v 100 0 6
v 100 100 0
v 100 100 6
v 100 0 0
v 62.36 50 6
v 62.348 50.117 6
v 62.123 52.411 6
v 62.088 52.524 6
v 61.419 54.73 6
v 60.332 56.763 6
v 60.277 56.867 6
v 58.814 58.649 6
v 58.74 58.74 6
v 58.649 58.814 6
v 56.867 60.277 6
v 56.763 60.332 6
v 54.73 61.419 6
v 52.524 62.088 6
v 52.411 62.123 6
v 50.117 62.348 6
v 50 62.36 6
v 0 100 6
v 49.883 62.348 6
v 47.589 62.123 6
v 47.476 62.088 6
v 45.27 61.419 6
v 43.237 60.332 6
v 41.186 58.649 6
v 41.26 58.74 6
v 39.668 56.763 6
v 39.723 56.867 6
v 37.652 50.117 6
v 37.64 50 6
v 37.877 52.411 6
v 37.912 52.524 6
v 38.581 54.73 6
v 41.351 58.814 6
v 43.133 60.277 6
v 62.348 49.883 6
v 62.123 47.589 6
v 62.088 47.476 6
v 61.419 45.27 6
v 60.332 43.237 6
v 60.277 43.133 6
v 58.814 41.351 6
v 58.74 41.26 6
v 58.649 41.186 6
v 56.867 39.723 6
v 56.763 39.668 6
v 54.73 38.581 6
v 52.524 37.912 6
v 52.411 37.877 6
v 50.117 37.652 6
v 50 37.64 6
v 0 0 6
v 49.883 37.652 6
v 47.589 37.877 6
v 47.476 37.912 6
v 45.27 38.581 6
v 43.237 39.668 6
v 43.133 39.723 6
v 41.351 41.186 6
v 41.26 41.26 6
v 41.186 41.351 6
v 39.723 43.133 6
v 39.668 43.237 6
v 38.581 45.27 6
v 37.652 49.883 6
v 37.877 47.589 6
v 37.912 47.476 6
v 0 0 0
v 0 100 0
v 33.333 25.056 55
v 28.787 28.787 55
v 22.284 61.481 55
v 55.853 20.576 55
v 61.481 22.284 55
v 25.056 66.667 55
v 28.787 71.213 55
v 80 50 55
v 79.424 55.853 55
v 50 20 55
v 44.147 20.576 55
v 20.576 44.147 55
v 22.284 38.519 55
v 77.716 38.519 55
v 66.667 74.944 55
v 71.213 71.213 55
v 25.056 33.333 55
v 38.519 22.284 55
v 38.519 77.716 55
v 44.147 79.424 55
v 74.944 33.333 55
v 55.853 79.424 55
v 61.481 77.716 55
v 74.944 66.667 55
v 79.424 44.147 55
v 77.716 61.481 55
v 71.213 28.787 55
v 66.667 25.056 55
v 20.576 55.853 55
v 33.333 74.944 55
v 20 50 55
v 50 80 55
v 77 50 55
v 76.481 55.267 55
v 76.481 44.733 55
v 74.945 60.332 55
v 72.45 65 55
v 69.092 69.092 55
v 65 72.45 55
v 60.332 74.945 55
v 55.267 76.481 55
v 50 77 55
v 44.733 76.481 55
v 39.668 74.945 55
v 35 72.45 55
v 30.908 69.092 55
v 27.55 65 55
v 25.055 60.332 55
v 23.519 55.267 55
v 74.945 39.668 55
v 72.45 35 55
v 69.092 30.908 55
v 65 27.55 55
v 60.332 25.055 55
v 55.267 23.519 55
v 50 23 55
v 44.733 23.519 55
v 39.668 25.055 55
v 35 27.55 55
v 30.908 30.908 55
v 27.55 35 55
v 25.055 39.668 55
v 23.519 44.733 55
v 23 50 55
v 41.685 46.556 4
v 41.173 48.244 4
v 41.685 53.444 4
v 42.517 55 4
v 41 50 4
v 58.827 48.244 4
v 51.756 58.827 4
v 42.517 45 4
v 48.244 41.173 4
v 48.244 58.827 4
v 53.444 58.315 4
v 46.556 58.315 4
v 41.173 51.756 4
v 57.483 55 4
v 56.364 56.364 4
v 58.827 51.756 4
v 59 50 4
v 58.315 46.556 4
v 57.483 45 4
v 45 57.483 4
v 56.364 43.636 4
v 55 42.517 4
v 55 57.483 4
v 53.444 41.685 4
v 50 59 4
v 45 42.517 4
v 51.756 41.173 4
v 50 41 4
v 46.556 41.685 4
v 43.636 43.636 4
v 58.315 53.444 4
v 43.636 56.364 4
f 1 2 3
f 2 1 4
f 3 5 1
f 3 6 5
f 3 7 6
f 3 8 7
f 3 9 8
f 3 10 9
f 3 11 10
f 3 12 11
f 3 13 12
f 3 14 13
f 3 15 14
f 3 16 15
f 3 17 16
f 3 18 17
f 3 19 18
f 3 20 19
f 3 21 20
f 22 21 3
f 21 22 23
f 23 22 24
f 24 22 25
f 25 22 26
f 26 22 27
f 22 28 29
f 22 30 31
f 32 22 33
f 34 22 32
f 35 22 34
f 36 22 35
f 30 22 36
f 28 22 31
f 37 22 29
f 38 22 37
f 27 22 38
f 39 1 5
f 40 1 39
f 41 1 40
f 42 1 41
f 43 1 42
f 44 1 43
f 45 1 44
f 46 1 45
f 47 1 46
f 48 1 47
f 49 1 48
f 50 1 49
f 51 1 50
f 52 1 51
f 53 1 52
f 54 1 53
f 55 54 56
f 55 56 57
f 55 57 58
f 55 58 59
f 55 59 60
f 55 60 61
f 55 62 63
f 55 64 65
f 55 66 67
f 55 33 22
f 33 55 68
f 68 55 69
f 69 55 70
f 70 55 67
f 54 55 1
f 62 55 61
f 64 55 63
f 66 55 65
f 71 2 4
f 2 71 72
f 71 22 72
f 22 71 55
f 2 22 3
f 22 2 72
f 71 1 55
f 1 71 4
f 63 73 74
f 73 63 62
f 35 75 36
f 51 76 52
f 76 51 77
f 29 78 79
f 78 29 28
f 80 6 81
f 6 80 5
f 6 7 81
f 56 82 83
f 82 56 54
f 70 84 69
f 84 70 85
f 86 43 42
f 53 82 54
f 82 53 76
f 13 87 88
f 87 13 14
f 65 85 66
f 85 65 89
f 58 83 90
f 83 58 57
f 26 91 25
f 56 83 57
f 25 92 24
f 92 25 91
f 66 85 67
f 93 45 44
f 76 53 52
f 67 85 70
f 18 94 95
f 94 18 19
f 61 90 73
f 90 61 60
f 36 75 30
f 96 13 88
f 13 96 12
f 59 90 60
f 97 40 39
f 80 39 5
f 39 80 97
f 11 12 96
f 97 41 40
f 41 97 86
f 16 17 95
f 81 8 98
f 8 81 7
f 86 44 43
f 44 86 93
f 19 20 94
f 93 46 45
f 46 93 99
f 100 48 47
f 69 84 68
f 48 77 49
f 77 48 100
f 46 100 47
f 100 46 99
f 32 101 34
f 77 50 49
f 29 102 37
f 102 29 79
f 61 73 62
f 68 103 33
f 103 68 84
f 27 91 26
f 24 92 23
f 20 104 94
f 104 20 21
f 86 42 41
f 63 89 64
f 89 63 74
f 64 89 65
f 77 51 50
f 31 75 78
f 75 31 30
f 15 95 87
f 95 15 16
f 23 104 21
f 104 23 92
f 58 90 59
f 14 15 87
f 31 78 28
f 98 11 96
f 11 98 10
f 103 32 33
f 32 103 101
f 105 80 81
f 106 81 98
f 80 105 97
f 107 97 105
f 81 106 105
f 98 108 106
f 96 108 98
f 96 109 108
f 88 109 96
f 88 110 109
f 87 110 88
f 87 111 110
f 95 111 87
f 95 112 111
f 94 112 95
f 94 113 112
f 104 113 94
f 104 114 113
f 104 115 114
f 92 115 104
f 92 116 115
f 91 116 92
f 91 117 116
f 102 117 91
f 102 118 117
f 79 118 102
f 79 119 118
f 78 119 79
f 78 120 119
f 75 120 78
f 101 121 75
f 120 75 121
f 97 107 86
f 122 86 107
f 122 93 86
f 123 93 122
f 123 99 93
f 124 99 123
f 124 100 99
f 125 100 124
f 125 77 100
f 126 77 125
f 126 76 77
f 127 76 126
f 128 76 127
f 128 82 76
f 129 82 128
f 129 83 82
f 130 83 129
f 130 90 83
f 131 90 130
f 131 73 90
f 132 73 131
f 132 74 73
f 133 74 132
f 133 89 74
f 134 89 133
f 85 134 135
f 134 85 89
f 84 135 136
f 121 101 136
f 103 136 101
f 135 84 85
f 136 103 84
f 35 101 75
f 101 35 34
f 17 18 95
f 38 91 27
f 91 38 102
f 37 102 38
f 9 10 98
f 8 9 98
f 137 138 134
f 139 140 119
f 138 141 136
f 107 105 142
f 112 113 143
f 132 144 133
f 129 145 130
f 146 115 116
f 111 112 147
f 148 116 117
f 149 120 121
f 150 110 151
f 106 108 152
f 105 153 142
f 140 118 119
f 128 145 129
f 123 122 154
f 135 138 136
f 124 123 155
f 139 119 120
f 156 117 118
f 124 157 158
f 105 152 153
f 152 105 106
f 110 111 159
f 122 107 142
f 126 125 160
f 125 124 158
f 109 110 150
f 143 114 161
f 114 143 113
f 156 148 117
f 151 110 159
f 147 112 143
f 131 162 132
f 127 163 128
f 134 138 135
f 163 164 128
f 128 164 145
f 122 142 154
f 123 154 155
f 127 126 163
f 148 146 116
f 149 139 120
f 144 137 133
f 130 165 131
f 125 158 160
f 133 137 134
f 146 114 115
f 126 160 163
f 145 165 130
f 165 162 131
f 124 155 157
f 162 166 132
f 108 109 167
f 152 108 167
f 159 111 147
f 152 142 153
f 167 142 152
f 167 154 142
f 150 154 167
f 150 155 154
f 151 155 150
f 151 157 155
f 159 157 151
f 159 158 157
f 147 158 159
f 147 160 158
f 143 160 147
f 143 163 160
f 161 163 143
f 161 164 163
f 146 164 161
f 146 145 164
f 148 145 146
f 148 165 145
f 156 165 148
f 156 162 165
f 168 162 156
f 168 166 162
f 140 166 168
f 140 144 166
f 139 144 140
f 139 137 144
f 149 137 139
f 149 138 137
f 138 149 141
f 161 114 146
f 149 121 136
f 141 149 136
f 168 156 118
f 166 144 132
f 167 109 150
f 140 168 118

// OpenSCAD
$fn = 32;

// ----------------------------------------------------------------------
// Hopper: funnel with square flange
// ----------------------------------------------------------------------

// --- parameters (mm) ---
fl = 100;                 // flange side, X and Y
fl_t = 6;                 // flange thickness
cone_h = 50;              // cone height above the flange
top_d = 60;               // cone mouth diameter
bot_d = 24;               // cone spout diameter
wall = 3;                 // cone wall thickness

bore_d = bot_d - 2 * wall;  // spout bore diameter
total_h = fl_t + cone_h - 1;  // overall height

difference() {
  union() {
    cube([fl, fl, fl_t]);
    translate([fl / 2, fl / 2, fl_t - 1])
      cylinder(h = cone_h, d1 = bot_d, d2 = top_d);
  }
  translate([fl / 2, fl / 2, fl_t - 2])
    cylinder(h = cone_h + 1, d1 = bore_d, d2 = top_d - 2 * wall);
}
